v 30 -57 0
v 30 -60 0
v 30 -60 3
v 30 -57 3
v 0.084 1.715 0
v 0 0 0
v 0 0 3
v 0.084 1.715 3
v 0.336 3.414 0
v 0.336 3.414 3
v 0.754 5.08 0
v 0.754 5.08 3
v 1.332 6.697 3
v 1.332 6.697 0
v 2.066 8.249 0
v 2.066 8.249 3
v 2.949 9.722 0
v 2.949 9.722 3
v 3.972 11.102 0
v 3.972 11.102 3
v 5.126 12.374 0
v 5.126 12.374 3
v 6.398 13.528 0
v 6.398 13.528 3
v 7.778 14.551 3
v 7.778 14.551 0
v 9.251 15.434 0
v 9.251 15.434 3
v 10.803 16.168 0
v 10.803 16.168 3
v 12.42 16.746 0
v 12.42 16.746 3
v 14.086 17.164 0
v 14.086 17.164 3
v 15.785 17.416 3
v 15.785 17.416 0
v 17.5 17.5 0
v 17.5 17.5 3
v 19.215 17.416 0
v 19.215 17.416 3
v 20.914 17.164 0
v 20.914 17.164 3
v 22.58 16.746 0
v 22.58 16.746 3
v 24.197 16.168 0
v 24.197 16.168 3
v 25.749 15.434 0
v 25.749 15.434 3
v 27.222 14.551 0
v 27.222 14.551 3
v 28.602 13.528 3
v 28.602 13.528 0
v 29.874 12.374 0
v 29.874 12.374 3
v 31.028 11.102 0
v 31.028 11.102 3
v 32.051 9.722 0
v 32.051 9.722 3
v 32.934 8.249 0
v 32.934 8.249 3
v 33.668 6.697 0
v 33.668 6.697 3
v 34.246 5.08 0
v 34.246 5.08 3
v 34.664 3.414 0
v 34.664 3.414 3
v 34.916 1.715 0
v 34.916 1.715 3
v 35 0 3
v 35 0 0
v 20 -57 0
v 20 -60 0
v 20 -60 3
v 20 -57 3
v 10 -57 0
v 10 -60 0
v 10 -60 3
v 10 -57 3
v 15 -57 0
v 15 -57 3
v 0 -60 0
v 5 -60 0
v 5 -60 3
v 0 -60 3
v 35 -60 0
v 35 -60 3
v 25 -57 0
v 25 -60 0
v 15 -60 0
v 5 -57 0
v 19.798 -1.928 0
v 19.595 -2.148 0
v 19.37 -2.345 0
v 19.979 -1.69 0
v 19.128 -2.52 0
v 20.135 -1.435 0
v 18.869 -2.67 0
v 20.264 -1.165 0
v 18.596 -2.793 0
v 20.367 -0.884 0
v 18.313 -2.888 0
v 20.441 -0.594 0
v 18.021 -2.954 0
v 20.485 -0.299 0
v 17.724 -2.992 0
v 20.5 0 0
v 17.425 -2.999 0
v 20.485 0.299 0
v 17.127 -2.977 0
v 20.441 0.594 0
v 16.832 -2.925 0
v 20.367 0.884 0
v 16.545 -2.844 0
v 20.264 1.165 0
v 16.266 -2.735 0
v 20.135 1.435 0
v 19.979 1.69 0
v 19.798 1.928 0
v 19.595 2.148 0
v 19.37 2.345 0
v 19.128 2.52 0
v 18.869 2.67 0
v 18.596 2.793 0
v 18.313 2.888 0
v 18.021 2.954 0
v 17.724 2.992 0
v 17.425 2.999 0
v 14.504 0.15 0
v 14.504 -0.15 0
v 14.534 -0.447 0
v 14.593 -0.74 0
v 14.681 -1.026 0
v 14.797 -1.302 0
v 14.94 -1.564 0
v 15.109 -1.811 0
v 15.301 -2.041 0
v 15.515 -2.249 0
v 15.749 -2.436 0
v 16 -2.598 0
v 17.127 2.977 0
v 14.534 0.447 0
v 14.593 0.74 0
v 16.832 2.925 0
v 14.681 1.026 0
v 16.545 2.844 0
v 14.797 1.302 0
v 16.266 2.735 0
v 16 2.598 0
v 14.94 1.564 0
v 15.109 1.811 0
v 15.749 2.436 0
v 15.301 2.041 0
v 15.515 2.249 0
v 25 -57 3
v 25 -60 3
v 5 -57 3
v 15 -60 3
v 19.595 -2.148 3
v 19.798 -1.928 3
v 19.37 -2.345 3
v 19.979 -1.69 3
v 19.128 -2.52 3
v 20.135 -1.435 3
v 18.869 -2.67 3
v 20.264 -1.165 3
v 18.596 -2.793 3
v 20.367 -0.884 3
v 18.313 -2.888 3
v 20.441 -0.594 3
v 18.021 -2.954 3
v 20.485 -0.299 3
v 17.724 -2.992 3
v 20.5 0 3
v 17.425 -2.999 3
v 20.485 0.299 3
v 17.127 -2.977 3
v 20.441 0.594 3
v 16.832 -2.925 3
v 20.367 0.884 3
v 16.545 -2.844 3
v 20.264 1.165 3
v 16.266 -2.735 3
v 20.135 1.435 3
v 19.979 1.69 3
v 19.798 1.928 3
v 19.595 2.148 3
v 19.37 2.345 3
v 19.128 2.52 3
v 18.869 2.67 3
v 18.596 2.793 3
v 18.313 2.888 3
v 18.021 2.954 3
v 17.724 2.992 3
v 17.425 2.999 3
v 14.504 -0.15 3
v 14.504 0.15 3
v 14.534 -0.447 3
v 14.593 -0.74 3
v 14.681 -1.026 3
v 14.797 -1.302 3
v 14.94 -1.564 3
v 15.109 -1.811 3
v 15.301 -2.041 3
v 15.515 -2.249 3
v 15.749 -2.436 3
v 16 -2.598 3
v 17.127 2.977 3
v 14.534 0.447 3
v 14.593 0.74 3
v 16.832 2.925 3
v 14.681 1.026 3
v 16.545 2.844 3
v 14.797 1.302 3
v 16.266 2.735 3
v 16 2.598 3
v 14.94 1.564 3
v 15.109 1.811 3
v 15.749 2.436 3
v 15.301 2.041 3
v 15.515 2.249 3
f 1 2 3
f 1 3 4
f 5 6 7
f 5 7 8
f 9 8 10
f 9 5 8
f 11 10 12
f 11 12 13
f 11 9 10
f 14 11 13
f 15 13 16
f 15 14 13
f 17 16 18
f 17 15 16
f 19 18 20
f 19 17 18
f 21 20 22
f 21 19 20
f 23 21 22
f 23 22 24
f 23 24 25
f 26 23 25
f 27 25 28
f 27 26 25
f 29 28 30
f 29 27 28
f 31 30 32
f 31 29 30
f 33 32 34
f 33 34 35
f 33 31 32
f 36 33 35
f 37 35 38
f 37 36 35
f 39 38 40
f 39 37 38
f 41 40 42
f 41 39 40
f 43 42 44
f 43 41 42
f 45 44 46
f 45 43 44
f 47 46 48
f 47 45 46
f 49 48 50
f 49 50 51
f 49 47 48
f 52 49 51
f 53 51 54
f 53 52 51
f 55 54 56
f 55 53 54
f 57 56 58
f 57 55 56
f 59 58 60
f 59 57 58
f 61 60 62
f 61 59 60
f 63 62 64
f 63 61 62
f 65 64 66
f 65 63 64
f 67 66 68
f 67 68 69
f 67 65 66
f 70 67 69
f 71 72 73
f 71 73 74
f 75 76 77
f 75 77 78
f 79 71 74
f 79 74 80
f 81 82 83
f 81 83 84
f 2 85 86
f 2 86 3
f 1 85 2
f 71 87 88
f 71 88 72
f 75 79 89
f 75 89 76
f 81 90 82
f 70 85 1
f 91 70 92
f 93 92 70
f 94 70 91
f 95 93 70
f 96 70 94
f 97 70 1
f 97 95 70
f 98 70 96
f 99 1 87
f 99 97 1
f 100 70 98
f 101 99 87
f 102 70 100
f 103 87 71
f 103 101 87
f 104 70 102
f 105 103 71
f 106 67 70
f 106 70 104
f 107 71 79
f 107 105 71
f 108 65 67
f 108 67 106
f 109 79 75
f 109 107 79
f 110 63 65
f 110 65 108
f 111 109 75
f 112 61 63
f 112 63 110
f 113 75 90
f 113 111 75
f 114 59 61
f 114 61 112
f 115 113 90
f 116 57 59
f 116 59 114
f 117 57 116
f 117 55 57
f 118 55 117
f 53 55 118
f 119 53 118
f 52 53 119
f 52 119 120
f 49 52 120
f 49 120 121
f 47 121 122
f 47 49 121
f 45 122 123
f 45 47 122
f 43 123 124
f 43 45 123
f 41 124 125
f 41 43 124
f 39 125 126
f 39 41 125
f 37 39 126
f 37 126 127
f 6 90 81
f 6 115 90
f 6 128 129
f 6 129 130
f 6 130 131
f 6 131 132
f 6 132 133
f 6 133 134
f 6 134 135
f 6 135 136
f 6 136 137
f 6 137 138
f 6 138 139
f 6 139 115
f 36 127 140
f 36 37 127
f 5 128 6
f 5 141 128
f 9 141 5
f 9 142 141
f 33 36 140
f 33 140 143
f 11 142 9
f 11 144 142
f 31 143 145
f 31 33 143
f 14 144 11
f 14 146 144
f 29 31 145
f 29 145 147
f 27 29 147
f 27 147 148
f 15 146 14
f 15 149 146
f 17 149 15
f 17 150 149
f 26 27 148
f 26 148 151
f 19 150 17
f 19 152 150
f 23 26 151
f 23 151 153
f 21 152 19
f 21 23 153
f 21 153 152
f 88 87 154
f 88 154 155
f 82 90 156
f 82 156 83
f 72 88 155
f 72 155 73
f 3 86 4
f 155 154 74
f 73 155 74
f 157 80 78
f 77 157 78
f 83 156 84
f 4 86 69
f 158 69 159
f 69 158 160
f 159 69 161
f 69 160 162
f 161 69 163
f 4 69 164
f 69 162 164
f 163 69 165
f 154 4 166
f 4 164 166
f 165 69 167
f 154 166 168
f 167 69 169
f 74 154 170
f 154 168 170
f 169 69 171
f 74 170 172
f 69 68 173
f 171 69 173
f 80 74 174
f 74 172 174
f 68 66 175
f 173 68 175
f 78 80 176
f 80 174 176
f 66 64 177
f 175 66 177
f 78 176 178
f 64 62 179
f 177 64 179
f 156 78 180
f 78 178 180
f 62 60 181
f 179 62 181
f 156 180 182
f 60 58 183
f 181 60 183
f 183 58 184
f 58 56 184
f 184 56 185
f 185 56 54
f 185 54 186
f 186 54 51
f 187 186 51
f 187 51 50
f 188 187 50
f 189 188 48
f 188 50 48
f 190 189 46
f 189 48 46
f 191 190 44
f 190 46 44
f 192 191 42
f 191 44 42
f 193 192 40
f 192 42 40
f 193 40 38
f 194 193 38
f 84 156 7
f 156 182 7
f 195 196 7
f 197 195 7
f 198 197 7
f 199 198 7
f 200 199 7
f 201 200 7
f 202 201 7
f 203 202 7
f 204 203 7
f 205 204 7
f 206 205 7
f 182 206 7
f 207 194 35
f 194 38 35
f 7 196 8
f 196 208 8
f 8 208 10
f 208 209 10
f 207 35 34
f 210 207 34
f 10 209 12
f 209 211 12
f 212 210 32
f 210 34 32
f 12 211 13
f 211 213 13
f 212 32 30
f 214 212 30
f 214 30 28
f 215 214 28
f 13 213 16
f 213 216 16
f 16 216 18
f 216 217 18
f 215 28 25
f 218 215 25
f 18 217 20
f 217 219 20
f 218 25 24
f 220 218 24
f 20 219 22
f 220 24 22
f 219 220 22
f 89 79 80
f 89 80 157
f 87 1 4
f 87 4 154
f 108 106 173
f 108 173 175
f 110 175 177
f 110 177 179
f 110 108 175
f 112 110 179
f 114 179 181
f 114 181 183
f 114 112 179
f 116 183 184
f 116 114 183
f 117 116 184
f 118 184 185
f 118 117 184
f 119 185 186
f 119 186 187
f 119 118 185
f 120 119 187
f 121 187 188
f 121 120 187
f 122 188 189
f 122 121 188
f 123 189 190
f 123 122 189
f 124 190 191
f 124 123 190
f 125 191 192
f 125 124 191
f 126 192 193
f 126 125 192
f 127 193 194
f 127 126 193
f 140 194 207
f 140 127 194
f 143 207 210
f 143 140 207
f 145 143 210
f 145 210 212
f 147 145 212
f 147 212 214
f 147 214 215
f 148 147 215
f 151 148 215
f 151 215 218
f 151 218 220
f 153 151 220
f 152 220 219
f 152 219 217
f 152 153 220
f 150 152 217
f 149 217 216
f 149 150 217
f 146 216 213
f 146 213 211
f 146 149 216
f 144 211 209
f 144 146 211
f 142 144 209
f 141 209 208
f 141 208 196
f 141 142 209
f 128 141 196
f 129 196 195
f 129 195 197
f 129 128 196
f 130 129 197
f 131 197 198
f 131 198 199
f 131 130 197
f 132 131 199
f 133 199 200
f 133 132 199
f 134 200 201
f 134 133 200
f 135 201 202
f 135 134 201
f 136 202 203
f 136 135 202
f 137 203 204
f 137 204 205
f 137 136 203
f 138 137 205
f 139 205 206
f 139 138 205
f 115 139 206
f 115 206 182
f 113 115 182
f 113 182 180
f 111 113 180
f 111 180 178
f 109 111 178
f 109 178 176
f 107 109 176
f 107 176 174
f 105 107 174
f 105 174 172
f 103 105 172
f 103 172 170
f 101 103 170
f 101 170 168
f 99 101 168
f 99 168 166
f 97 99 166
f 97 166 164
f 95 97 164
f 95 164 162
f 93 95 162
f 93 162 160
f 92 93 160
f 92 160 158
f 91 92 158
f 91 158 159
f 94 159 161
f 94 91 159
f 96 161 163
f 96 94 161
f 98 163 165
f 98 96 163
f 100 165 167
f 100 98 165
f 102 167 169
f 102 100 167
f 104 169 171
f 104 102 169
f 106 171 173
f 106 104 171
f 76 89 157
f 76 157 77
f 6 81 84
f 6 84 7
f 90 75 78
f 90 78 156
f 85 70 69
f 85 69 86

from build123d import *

# Parameters (mm, degrees)
CROQUIS1_R              = 3
SALIENTE_EXTRUIR1_DEPTH = 3


with BuildPart() as part:
    # Croquis1 → Saliente-Extruir1 (new body)
    with BuildSketch(Plane.XY):
        with BuildLine():
            Line((0, -60), (0, 0))
            ThreePointArc((0, 0), (17.5, 17.5), (35, 0))
            Line((35, 0), (35, -60))
            Line((35, -60), (30, -60))
            Line((30, -60), (30, -57))
            Line((30, -57), (25, -57))
            Line((25, -57), (25, -60))
            Line((25, -60), (20, -60))
            Line((20, -60), (20, -57))
            Line((20, -57), (15, -57))
            Line((15, -57), (15, -60))
            Line((15, -60), (10, -60))
            Line((10, -60), (10, -57))
            Line((10, -57), (5, -57))
            Line((5, -57), (5, -60))
            Line((5, -60), (0, -60))
        make_face()
        with Locations((17.5, 0)):
            Circle(CROQUIS1_R, mode=Mode.SUBTRACT)
    extrude(amount=SALIENTE_EXTRUIR1_DEPTH)


solid = part.part
